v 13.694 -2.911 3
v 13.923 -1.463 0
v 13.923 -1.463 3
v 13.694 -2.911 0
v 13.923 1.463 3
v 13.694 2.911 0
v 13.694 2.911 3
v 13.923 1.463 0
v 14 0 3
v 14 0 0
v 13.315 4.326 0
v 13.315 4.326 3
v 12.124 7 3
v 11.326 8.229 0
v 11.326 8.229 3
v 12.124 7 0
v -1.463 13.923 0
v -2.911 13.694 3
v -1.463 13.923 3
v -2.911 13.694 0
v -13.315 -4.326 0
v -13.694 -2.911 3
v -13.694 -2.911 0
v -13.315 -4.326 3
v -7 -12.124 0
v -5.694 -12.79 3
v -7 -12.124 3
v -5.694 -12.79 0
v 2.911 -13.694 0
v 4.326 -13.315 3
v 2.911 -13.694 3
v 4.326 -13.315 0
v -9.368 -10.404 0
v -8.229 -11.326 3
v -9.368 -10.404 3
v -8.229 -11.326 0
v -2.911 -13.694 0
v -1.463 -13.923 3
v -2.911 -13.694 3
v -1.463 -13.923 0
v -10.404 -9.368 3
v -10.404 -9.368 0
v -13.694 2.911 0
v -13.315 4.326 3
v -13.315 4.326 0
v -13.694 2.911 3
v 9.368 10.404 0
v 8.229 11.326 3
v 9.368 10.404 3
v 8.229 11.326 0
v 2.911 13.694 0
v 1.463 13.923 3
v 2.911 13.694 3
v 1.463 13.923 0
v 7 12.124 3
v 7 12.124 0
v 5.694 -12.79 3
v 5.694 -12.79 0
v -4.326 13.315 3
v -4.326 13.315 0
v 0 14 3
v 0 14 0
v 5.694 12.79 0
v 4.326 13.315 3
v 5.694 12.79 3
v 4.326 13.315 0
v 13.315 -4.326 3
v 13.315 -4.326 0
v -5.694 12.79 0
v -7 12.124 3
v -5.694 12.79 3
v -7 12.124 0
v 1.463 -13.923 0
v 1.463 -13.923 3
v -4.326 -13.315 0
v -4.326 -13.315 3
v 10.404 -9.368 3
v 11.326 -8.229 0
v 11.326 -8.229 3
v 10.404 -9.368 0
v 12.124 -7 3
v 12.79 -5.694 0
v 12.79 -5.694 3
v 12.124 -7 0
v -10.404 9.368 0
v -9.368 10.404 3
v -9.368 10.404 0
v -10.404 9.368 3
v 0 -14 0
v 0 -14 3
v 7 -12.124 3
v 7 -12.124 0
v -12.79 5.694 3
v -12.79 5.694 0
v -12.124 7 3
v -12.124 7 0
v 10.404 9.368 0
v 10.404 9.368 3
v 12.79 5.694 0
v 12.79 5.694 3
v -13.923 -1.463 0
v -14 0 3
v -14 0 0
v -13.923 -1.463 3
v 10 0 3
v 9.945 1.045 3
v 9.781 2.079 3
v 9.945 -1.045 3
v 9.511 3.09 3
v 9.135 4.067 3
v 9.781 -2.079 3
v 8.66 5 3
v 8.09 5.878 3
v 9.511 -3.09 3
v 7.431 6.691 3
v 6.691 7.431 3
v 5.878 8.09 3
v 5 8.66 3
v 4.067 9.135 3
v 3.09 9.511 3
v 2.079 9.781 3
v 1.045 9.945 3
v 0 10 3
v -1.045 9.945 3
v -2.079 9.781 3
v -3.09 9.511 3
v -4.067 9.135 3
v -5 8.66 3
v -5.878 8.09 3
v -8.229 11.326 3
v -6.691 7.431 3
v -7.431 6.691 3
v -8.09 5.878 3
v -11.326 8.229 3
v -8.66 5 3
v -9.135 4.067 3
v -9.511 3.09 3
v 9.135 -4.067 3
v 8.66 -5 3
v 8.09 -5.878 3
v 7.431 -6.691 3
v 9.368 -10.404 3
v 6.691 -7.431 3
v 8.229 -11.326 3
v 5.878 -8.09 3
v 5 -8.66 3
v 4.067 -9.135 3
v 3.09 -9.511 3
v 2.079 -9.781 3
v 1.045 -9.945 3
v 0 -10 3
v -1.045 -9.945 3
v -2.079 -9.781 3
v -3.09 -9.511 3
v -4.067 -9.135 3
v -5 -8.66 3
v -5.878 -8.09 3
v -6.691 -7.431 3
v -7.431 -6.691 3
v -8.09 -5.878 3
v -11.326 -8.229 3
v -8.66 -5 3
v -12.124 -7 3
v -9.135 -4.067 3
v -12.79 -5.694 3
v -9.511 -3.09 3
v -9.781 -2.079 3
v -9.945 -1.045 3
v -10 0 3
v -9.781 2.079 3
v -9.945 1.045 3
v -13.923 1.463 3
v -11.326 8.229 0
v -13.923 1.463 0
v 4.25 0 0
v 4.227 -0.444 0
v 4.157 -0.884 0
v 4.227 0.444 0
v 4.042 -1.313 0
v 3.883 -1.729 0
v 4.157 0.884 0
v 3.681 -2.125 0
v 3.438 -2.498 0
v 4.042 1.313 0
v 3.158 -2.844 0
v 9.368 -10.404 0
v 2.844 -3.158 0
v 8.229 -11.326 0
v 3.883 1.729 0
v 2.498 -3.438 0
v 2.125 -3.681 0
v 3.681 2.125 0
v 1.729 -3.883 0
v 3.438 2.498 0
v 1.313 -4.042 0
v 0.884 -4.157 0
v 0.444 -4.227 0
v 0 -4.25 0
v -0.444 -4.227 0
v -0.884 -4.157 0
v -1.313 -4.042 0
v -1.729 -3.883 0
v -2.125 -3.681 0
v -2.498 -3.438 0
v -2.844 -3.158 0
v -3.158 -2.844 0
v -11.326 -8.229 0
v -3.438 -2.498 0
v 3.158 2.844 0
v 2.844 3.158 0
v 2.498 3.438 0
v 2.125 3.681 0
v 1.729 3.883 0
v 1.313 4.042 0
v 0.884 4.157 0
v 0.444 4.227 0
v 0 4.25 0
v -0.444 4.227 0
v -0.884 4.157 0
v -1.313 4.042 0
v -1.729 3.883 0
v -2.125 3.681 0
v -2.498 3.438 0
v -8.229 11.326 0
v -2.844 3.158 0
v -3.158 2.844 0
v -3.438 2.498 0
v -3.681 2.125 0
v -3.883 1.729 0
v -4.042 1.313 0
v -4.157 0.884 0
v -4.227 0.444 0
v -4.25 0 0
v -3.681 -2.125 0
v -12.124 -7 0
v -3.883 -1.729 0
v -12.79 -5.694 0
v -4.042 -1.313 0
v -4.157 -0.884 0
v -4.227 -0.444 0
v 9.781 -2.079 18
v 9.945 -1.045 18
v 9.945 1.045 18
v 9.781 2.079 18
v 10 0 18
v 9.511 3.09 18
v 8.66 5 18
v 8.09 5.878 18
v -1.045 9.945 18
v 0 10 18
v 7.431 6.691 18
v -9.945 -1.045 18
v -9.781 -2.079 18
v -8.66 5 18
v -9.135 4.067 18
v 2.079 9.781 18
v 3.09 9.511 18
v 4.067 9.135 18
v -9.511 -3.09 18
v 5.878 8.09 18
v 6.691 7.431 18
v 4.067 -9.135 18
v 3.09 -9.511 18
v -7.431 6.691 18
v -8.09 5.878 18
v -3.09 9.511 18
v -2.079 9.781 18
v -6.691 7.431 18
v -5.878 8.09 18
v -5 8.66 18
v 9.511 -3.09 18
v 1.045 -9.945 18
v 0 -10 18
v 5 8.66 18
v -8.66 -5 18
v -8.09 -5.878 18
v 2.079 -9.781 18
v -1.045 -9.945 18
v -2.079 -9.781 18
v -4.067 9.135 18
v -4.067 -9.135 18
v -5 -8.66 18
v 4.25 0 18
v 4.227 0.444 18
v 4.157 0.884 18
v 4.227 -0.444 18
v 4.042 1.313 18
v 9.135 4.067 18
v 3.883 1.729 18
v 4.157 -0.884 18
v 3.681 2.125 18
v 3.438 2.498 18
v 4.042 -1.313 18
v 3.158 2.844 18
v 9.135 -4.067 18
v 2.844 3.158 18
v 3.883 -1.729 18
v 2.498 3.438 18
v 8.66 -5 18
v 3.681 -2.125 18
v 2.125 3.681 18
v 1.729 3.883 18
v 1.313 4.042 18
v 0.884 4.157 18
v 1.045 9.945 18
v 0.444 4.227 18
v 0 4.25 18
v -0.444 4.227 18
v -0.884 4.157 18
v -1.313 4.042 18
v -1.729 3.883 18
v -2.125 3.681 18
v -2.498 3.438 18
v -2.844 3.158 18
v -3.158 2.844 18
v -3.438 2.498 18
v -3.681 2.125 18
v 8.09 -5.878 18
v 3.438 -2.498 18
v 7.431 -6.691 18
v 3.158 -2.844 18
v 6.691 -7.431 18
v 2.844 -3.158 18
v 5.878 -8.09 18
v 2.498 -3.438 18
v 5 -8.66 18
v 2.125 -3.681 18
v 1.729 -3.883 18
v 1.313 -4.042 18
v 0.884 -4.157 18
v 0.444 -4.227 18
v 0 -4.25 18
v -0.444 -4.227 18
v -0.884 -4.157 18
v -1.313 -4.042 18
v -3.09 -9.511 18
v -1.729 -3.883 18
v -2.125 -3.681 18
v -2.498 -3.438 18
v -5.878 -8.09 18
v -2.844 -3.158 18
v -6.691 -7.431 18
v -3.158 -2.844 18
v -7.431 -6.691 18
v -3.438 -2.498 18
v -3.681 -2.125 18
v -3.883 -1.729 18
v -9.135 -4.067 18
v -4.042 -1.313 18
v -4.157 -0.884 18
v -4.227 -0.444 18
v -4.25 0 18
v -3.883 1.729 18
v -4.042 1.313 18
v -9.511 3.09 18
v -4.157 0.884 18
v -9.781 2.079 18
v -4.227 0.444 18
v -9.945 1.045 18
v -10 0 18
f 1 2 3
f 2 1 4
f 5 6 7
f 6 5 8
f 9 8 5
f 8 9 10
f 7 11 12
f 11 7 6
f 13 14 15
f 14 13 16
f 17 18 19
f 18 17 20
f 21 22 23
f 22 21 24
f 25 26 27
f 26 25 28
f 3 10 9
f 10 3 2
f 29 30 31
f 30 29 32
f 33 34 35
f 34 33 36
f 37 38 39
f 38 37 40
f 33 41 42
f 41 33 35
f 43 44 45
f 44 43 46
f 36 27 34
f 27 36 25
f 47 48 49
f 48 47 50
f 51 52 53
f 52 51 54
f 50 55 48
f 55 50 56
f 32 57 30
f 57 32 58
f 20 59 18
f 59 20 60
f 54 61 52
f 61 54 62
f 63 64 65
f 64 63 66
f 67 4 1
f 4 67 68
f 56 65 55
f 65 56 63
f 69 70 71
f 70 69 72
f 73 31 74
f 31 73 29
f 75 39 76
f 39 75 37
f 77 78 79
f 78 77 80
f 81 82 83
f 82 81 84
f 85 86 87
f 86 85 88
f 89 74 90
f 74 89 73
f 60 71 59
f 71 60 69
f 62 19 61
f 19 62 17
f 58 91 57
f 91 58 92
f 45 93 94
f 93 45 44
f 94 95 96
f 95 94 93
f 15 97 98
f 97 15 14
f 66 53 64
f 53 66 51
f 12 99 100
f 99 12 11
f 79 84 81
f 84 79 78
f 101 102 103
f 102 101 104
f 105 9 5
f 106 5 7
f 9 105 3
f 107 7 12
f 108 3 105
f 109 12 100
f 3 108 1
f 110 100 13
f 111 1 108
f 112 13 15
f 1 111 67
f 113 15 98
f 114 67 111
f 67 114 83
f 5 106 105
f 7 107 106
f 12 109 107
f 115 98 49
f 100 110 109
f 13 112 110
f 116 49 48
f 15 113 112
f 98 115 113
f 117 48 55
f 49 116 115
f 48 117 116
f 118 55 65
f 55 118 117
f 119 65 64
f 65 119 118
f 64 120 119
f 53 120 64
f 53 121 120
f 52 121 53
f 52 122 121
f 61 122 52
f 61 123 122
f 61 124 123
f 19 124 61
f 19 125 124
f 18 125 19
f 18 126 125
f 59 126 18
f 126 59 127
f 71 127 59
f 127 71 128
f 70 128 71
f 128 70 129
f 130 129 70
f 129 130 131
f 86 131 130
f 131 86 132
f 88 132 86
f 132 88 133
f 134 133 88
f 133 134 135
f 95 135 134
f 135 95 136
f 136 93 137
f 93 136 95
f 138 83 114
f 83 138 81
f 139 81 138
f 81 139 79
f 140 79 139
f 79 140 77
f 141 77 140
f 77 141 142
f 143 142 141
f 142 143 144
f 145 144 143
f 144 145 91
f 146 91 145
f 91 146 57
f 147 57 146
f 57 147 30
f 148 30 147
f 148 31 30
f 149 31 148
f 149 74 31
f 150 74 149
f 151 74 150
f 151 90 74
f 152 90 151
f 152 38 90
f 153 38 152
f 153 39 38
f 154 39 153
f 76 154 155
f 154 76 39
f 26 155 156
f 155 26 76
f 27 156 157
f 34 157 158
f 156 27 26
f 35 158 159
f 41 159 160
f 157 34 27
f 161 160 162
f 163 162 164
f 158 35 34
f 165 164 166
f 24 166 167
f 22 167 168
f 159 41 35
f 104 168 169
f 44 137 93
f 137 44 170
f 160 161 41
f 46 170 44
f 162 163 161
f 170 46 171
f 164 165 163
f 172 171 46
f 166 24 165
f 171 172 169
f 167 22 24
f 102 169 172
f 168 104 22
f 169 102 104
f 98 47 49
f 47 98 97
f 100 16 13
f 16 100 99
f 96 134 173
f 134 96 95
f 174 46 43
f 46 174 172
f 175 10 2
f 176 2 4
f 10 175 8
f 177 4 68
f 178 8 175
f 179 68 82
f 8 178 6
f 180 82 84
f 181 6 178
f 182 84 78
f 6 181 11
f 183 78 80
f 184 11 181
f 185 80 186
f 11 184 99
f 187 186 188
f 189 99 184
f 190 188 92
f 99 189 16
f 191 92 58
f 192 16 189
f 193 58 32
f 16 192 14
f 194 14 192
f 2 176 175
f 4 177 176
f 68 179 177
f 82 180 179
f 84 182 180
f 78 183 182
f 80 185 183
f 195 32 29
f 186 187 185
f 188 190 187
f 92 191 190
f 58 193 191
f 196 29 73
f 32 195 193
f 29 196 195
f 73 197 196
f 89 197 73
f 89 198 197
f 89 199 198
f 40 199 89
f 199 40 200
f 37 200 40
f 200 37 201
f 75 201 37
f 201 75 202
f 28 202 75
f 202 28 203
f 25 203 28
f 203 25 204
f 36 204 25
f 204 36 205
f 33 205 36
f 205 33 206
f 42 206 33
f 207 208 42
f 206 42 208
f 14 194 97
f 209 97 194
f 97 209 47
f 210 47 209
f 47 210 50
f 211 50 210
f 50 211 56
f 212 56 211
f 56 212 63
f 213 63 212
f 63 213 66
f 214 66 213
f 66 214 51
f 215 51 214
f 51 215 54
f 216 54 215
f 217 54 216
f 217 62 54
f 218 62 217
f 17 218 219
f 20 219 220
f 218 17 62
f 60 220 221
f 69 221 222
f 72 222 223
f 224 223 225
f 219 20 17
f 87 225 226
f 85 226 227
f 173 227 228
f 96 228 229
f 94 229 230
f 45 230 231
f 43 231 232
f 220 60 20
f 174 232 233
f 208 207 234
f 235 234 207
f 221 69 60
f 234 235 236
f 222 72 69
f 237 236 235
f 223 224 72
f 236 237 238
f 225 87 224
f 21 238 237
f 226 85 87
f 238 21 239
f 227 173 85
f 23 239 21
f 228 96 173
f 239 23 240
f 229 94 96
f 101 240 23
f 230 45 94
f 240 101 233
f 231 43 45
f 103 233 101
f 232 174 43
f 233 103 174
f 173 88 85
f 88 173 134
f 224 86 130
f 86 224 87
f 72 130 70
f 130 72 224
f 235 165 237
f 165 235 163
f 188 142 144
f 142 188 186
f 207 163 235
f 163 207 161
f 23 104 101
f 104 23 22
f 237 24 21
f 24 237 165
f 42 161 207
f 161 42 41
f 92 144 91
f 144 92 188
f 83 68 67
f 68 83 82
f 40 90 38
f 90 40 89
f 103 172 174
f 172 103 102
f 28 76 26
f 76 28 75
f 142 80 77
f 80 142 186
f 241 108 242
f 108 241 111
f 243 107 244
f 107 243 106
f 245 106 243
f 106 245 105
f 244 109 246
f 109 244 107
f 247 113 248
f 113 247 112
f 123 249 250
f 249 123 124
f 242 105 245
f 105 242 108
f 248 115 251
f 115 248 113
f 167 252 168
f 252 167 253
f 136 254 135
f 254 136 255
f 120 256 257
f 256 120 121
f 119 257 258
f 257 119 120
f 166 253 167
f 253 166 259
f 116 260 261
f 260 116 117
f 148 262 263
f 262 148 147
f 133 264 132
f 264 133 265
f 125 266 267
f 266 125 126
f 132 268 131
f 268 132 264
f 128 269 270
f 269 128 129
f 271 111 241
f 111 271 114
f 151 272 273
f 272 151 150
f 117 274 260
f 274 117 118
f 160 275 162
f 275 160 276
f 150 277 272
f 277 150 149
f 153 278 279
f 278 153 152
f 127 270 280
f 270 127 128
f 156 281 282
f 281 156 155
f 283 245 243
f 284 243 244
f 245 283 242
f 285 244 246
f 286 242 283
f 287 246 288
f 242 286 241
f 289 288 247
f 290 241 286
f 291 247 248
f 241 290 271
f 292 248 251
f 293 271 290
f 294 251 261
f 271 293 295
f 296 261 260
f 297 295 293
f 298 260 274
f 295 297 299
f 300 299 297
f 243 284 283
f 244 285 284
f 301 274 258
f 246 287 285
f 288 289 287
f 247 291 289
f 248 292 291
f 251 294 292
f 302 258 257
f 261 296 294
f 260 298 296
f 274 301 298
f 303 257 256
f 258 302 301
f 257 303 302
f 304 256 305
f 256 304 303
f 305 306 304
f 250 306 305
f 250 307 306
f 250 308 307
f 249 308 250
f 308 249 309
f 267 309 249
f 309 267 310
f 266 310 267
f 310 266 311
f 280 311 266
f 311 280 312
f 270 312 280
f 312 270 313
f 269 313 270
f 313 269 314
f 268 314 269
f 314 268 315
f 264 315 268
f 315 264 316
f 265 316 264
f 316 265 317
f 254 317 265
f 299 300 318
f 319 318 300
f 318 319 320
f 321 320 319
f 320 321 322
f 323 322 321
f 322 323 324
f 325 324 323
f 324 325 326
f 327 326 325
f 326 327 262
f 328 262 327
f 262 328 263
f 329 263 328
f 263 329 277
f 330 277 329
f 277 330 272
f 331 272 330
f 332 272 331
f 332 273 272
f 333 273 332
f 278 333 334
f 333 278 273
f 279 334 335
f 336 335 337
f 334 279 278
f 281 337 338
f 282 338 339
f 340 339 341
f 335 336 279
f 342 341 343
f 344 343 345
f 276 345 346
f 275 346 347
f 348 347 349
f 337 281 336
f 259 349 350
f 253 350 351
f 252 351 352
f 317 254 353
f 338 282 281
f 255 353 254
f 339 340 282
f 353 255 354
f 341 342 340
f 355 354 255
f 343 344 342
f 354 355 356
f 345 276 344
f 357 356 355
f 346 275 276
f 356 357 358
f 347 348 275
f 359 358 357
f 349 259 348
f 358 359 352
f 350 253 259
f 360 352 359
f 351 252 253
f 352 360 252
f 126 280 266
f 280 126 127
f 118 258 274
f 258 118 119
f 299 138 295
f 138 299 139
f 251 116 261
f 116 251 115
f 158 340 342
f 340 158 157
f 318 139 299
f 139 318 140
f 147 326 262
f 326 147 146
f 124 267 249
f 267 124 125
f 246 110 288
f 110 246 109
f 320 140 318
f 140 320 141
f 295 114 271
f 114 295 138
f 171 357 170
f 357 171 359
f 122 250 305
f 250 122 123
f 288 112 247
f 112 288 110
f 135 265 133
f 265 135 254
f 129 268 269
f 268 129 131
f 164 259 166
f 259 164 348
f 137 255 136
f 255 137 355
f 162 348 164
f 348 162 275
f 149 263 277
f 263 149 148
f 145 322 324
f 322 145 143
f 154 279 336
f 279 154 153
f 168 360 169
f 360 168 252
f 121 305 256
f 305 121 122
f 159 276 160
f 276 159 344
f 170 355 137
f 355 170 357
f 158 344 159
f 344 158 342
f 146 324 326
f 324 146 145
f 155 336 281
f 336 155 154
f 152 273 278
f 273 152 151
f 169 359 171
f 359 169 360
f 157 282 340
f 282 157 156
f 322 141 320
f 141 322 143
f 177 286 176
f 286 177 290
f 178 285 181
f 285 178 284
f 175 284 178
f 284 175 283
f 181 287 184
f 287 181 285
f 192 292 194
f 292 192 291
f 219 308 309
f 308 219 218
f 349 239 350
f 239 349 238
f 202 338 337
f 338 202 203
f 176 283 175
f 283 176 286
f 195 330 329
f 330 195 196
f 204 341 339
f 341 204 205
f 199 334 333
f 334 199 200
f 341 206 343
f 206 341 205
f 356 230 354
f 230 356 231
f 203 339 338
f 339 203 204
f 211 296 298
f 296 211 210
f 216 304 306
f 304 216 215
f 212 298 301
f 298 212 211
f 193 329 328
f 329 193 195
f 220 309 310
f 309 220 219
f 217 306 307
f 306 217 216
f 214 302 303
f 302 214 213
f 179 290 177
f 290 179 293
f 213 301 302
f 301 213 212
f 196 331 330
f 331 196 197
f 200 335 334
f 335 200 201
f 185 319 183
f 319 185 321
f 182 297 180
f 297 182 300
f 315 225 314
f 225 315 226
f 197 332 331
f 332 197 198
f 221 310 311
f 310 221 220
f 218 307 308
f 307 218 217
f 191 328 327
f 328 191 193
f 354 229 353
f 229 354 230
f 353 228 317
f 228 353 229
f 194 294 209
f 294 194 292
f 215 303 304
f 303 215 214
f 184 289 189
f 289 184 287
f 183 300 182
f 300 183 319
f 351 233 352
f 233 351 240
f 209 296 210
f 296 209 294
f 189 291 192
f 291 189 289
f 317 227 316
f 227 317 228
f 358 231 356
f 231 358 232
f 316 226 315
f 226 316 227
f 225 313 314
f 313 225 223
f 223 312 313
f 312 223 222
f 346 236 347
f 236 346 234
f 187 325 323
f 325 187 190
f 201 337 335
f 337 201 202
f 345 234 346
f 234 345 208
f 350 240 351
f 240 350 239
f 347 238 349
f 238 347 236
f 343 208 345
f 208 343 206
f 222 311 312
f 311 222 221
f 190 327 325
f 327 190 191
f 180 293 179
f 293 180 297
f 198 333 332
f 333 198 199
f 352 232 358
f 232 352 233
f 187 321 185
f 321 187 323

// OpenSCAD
// Cable gland body for 8 mm cable.
$fn = 60;
eps = 0.02;
cable_d = 8;
body_d = 20;
body_l = 18;
flange_d = body_d + 8;
flange_t = 3;
difference() {
    union() { cylinder(d = flange_d, h = flange_t); cylinder(d = body_d, h = body_l); }
    translate([0, 0, -eps]) cylinder(d = cable_d + 0.5, h = body_l + 2 * eps);
}
